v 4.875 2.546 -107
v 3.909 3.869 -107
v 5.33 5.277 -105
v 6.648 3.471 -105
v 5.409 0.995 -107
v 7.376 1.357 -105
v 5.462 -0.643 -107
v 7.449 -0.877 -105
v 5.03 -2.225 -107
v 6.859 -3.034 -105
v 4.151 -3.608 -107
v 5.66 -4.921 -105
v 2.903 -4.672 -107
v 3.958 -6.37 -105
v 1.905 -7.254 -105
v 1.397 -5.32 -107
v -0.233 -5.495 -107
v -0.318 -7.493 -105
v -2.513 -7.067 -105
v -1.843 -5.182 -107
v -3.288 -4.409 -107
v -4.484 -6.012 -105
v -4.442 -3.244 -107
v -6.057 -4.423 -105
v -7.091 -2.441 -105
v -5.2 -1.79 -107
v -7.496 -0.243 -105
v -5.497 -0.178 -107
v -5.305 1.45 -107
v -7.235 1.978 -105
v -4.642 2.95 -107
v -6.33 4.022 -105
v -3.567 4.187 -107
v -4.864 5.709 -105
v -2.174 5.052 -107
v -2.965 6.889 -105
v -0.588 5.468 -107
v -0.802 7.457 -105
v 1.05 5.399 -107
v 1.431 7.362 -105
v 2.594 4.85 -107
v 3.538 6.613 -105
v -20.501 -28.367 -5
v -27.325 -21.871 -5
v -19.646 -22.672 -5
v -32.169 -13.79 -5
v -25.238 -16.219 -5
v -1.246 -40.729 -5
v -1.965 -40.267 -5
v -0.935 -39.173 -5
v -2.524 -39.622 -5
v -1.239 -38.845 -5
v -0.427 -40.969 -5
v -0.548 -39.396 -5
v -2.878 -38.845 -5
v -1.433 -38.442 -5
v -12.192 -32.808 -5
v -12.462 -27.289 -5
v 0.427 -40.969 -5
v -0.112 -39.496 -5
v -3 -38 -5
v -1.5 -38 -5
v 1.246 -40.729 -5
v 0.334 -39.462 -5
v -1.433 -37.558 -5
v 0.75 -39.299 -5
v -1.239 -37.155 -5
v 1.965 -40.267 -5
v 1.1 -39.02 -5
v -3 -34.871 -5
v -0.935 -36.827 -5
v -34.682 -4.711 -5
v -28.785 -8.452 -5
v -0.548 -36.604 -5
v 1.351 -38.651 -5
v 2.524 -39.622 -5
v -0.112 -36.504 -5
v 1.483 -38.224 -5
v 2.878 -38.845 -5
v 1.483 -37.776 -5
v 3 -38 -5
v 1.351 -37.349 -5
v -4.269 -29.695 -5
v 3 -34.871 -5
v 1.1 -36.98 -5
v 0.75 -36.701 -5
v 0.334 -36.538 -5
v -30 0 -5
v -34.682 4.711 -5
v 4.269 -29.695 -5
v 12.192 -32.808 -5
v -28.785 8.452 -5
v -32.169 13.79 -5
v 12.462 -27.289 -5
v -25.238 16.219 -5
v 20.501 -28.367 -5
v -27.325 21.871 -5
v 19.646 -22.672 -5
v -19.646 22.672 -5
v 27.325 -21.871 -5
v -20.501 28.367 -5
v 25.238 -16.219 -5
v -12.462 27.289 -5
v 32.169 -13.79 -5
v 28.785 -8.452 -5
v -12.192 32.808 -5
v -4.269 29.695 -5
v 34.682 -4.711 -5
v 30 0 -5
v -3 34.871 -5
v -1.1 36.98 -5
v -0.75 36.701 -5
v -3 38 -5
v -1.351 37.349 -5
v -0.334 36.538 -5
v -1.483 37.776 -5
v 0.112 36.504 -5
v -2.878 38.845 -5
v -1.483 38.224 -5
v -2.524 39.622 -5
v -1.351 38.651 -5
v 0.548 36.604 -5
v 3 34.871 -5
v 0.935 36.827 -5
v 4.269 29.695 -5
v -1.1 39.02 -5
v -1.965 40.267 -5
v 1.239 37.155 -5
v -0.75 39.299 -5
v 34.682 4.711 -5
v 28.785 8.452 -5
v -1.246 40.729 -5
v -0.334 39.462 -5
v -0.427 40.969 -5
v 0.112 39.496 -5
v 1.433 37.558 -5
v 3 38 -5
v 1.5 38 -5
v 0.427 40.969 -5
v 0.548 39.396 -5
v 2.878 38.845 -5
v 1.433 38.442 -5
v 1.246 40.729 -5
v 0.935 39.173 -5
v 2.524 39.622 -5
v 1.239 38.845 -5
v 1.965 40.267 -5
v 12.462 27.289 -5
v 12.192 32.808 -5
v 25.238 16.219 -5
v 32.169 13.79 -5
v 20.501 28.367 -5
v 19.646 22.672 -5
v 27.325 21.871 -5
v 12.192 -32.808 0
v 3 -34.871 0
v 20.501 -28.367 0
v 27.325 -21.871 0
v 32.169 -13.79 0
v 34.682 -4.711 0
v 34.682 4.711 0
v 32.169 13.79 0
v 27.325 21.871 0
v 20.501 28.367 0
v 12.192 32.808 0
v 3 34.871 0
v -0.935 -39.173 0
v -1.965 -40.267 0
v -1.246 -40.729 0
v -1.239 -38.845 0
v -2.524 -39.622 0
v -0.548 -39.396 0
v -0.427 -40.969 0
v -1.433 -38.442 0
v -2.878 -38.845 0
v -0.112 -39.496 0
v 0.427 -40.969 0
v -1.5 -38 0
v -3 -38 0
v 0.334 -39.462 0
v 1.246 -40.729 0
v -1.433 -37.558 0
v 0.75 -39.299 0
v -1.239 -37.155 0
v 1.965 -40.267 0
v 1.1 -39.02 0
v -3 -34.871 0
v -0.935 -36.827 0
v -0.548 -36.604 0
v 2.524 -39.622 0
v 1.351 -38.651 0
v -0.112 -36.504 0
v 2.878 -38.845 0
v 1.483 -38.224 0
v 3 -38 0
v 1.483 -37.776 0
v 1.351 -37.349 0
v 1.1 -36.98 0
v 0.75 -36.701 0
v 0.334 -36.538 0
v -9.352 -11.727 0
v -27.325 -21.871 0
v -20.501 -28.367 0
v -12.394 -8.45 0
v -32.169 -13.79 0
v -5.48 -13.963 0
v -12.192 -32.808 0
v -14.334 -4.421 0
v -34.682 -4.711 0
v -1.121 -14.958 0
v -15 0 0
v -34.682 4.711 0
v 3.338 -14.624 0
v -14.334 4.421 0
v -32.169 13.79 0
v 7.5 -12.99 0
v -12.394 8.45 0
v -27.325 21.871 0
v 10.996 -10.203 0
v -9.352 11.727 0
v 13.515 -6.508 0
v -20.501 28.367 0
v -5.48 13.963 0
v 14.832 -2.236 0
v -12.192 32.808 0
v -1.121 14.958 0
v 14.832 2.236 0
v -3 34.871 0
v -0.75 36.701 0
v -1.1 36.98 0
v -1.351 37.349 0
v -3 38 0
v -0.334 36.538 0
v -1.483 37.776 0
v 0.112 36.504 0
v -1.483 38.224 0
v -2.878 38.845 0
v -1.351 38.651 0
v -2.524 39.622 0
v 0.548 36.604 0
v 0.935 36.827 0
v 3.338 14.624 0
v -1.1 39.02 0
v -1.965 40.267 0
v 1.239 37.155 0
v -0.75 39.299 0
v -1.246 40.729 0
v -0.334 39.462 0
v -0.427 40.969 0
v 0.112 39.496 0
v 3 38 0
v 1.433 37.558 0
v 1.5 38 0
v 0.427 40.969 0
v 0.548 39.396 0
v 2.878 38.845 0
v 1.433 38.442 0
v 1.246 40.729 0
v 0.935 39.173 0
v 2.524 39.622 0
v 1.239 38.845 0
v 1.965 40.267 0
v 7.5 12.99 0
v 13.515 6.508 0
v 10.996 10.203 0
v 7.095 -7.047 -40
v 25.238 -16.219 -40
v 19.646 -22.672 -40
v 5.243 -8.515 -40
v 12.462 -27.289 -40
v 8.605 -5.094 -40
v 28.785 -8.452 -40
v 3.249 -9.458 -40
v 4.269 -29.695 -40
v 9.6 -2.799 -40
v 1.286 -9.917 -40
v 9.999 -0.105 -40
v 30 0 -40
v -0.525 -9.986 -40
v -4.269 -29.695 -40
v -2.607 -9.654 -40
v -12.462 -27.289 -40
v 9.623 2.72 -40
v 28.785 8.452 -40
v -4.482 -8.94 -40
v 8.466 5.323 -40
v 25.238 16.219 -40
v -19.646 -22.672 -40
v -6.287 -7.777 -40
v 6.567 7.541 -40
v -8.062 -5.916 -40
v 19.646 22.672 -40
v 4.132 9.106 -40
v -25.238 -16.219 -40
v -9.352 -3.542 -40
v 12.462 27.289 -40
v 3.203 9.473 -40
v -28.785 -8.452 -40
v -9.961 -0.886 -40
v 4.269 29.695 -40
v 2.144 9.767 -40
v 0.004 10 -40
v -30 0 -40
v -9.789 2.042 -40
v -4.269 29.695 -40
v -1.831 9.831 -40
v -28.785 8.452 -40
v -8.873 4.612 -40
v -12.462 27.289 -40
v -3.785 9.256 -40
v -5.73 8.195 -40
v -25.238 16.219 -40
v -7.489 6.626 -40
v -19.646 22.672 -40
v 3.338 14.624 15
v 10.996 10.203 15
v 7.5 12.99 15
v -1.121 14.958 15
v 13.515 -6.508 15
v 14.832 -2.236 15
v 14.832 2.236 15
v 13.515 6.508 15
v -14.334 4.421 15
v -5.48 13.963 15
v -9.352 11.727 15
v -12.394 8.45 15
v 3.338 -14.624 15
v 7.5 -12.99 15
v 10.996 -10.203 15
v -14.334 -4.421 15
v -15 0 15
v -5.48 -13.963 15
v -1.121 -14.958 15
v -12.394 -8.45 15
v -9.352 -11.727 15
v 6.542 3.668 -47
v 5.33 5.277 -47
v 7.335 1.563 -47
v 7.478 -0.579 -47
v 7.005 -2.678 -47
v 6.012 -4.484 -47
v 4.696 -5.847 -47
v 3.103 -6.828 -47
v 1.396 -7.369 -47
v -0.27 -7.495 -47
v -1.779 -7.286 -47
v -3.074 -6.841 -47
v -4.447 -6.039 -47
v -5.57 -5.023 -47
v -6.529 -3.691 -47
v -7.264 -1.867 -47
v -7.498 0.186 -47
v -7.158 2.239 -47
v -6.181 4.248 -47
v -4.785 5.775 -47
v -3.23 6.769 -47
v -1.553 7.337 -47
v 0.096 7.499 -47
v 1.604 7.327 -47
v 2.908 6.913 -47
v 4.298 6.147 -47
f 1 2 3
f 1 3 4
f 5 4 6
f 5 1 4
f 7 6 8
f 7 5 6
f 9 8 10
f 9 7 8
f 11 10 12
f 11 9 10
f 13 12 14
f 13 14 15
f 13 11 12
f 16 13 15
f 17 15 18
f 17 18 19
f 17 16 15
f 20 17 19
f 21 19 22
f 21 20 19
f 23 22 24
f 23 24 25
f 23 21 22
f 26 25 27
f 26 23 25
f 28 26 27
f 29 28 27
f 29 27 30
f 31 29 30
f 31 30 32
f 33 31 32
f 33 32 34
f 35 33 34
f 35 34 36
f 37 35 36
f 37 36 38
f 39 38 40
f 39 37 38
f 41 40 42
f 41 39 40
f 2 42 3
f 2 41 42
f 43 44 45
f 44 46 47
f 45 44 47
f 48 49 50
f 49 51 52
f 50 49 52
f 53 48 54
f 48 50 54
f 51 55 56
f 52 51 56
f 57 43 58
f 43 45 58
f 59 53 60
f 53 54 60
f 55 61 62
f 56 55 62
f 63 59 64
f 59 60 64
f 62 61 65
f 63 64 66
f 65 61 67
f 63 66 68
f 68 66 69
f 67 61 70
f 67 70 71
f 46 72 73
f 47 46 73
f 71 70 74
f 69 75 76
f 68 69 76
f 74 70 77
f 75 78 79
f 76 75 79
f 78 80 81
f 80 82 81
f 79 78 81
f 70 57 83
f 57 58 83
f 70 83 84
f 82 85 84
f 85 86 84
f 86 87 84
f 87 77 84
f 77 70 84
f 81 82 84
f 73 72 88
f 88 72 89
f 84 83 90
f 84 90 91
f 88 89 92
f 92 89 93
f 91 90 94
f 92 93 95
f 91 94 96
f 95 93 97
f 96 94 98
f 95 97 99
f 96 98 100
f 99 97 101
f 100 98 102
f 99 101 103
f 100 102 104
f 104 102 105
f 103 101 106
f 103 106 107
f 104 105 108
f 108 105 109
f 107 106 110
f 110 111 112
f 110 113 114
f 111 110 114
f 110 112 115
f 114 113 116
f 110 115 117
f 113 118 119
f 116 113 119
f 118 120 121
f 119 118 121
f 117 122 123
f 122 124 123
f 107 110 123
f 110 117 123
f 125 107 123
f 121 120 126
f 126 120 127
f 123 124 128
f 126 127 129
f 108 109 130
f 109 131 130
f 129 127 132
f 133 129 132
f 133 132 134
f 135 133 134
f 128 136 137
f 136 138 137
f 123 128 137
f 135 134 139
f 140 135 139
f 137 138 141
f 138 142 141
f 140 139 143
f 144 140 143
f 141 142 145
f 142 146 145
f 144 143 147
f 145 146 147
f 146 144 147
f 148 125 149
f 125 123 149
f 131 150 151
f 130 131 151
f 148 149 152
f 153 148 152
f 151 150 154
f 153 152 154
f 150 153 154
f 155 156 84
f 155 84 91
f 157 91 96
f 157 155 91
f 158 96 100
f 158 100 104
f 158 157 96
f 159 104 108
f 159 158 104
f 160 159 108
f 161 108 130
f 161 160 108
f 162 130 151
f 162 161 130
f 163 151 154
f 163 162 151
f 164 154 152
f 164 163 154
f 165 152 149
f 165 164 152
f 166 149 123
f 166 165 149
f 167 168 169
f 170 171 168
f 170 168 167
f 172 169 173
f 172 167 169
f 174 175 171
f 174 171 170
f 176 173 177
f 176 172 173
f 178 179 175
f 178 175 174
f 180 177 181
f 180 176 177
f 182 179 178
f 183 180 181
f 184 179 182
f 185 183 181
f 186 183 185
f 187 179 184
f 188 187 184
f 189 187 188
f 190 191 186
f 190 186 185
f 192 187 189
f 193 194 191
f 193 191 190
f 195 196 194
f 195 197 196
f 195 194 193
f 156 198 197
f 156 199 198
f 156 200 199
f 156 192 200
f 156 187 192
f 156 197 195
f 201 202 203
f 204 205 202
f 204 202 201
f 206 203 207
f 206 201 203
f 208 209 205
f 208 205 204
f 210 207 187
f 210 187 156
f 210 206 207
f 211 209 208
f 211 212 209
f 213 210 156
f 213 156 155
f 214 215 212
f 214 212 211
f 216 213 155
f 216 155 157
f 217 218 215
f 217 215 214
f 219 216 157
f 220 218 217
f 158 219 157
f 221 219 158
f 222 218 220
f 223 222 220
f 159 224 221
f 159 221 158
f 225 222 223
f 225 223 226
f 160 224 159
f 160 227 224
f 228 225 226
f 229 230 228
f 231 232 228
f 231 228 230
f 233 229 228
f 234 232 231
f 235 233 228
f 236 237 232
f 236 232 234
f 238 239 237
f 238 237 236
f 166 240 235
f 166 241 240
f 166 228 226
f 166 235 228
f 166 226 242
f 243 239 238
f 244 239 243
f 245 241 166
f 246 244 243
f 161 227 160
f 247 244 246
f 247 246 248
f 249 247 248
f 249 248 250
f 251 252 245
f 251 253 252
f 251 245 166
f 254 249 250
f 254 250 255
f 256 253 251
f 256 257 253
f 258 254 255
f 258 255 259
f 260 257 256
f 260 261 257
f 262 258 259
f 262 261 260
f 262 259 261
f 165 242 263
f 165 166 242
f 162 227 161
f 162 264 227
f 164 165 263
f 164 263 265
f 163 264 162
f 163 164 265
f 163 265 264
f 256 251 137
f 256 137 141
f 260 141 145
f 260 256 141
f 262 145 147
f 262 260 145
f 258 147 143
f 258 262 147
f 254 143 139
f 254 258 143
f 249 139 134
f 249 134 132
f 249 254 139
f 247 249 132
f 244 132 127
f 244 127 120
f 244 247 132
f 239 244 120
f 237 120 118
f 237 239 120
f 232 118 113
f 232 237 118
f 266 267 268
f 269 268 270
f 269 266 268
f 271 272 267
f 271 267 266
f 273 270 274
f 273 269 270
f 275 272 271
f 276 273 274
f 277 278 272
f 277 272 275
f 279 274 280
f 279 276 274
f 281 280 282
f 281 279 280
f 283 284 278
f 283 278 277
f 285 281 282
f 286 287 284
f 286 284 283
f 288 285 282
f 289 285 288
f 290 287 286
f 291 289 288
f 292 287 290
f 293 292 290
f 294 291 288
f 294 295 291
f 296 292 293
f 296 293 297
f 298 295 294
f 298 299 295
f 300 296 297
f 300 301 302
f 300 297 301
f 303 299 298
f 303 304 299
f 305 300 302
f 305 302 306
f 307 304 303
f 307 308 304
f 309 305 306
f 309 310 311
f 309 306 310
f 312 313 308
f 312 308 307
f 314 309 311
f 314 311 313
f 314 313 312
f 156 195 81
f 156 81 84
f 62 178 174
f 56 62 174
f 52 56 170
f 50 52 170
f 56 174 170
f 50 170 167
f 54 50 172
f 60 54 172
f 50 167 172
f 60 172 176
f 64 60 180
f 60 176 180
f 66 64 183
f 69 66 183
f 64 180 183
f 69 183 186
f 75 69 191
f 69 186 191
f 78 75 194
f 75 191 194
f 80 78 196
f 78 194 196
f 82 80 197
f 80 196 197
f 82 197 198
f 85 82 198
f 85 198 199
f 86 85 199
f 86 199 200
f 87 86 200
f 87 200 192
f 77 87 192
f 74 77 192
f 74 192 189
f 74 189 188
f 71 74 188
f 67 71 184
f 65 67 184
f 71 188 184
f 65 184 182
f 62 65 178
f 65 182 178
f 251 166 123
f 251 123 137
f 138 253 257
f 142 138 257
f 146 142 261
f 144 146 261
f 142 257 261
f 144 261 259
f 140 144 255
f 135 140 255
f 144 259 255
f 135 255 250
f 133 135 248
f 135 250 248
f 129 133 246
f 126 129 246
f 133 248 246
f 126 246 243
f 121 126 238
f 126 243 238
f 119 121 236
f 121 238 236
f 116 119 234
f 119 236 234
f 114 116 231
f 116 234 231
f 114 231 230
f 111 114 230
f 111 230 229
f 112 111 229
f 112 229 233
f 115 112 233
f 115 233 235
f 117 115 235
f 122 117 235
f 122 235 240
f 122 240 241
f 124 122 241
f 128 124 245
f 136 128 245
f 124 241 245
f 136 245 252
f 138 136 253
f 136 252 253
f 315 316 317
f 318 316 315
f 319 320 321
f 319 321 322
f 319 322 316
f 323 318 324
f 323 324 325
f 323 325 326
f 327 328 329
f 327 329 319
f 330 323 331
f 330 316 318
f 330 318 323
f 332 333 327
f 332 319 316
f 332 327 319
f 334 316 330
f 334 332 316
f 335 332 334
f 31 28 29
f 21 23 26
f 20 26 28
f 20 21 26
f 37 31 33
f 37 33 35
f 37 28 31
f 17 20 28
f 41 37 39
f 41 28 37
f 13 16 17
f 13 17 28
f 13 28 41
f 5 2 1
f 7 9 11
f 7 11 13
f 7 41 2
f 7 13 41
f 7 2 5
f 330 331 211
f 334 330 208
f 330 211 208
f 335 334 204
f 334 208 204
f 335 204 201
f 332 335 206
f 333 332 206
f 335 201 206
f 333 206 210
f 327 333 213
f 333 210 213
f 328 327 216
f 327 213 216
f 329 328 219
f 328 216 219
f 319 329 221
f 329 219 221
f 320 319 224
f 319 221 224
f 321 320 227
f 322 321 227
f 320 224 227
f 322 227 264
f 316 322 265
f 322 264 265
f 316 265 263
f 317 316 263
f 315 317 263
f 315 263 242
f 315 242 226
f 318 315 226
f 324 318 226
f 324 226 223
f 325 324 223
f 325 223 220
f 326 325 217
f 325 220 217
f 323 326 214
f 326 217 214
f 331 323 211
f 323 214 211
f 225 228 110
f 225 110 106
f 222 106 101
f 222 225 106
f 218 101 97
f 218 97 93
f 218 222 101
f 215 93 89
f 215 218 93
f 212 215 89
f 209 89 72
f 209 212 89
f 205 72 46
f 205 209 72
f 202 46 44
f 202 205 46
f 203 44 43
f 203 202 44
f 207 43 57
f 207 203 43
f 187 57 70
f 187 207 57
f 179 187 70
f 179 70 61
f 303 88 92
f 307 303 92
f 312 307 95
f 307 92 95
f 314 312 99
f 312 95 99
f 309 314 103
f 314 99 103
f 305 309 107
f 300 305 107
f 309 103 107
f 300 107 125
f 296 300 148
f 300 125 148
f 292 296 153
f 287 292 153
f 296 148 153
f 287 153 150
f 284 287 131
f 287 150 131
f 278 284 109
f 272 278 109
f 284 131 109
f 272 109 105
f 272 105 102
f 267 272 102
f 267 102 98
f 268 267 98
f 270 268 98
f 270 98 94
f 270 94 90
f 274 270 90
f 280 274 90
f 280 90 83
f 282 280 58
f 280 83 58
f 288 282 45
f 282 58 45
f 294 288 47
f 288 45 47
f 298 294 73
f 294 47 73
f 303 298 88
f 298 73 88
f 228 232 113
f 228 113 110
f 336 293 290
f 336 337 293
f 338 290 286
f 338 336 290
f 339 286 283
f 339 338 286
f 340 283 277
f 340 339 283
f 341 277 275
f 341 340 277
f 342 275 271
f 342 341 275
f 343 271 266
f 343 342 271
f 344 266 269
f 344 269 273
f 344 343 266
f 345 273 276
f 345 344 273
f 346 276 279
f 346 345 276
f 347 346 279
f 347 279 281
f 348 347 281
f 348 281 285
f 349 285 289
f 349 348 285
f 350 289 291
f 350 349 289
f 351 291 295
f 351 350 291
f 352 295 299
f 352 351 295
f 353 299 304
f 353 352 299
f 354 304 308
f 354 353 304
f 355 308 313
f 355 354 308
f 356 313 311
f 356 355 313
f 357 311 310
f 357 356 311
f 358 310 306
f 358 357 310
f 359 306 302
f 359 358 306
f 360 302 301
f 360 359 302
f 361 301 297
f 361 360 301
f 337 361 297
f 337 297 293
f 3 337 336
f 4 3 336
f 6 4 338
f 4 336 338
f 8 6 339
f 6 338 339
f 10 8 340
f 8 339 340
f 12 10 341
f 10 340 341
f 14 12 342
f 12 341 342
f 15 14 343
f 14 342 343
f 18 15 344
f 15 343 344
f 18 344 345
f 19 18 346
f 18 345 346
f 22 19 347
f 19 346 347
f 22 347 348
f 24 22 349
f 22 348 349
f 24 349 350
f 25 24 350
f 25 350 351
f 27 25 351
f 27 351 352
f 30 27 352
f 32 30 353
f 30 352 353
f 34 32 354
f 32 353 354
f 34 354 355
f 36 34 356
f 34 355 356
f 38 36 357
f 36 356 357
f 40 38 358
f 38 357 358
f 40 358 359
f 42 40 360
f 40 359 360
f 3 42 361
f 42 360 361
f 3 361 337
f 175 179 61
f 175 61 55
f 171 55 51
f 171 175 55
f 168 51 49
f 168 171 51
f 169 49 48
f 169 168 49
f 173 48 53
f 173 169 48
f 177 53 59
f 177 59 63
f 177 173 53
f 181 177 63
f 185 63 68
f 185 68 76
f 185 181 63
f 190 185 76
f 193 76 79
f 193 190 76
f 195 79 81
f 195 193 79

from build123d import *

# Parameters (mm, degrees)
SKETCH1_R           = 1.5
BOSS_EXTRUDE1_DEPTH = 5
SKETCH2_R           = 15
BOSS_EXTRUDE2_DEPTH = 15
SKETCH3_R           = 30
BOSS_EXTRUDE3_DEPTH = 35
SKETCH6_R           = 7.5
BOSS_EXTRUDE5_DEPTH = 60
CHAMFER2_SIZE       = 2


with BuildPart() as part:
    # Sketch1 → Boss-Extrude1 (new body)
    with BuildSketch(Plane.XY):
        with BuildLine():
            Line((-3, 38), (-3, 34.871191548))
            ThreePointArc((-3, 34.871191548), (-35, 0), (-3, -34.871191548))
            Line((-3, -34.871191548), (-3, -38))
            ThreePointArc((-3, -38), (0, -41), (3, -38))
            Line((3, -38), (3, -34.871191548))
            ThreePointArc((3, -34.871191548), (35, 0), (3, 34.871191548))
            Line((3, 34.871191548), (3, 38))
            ThreePointArc((3, 38), (0, 41), (-3, 38))
        make_face()
        with Locations((0, 38)):
            Circle(SKETCH1_R, mode=Mode.SUBTRACT)
        with Locations(Location((0, -38, 0), (0, 0, 180))):
            Circle(SKETCH1_R, mode=Mode.SUBTRACT)
    extrude(amount=-BOSS_EXTRUDE1_DEPTH)

    # Sketch2 → Boss-Extrude2 (add)
    with BuildSketch(Plane.XY):
        with Locations(Location((0, 0, 0), (0, 0, 180))):
            Circle(SKETCH2_R)
    extrude(amount=BOSS_EXTRUDE2_DEPTH)

    # Sketch3 → Boss-Extrude3 (add)
    with BuildSketch(Plane(origin=(0, 0, -5), x_dir=(-1, 0, 0), z_dir=(0, 0, -1))):
        Circle(SKETCH3_R)
    extrude(amount=BOSS_EXTRUDE3_DEPTH)

    # Loft1: read off the stored shape, not the designer's step
    # Loft1: loft between two sections, ruled curve by curve
    loft1_from = [
        Edge.make_bspline([(4.132315812, 9.106259717, -40), (22.344835246, 0.841628092, -40), (14.080203621, -17.370891341, -40), (-4.132315812, -9.106259717, -40), (-22.344835246, -0.841628092, -40), (-14.080203621, 17.370891341, -40), (4.132315812, 9.106259717, -40)], [0, 0, 0, 0, 0.5, 0.5, 0.5, 1, 1, 1, 1], 3, [1, 0.333333333, 0.333333333, 1, 0.333333333, 0.333333333, 1]),
    ]
    loft1_to = [
        Edge.make_bspline([(5.329891047, 5.276576677, -47), (15.8830444, -5.383205418, -47), (5.223262306, -15.936358771, -47), (-5.329891047, -5.276576677, -47), (-15.8830444, 5.383205418, -47), (-5.223262306, 15.936358771, -47), (5.329891047, 5.276576677, -47)], [0, 0, 0, 0, 0.5, 0.5, 0.5, 1, 1, 1, 1], 3, [1, 0.333333333, 0.333333333, 1, 0.333333333, 0.333333333, 1]),
    ]
    loft1 = Solid(Shell([*[Face.make_surface_from_curves(loft1_from[k], loft1_to[k]) for k in range(1)], Face(Wire(loft1_from)), Face(Wire(loft1_to))]))
    add(loft1)

    # Sketch6 → Boss-Extrude5 (add)
    with BuildSketch(Plane(origin=(0, 0, -47), x_dir=(-1, 0, 0), z_dir=(0, 0, -1))):
        with Locations(Location((0, 0, 0), (0, 0, 135.288))):
            Circle(SKETCH6_R)
    extrude(amount=BOSS_EXTRUDE5_DEPTH)

    # Chamfer2
    chamfer2_edges = [part.edges().sort_by_distance(p)[0] for p in [
        (-5.329891047, -5.276576677, -107),
    ]]
    chamfer(chamfer2_edges, length=CHAMFER2_SIZE)


solid = part.part
